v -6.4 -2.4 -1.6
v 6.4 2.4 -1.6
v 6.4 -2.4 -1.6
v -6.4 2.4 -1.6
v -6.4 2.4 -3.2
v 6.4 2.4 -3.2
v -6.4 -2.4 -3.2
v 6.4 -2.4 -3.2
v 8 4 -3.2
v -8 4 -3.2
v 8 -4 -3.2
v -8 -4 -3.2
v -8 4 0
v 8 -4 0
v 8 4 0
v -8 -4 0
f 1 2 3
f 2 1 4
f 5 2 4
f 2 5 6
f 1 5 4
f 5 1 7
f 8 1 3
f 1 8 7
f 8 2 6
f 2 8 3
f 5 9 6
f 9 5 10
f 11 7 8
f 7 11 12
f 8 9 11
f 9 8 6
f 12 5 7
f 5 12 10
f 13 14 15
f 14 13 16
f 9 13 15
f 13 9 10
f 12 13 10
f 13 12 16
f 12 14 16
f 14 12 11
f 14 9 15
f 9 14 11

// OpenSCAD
// file: ../p/box5.scad
use <../lib.scad>
function ldraw_lib__box5() = [
// 0 Box with 5 Faces and All Edges
// 0 Name: box5.dat
// 0 Author: James Jessiman
// 0 !LDRAW_ORG Primitive UPDATE 2012-01
// 0 !LICENSE Licensed under CC BY 4.0 : see CAreadme.txt
// 
// 0 BFC CERTIFY CCW
  [0,"BFC","CERTIFY"],
  [0,"BFC","CCW"],
// 
// 0 !HISTORY 2002-04-03 [sbliss] Modified for BFC compliance
// 0 !HISTORY 2002-04-25 [PTadmin] Official Update 2002-02
// 0 !HISTORY 2007-06-24 [PTadmin] Header formatted for Contributor Agreement
// 0 !HISTORY 2008-07-01 [PTadmin] Official Update 2008-01
// 0 !HISTORY 2012-02-16 [Philo] Changed to CCW
// 0 !HISTORY 2012-03-30 [PTadmin] Official Update 2012-01
// 
// 
// 2 24 1 1 1 -1 1 1
  [2,24,1,1,1,-1,1,1],
// 2 24 -1 1 1 -1 1 -1
  [2,24,-1,1,1,-1,1,-1],
// 2 24 -1 1 -1 1 1 -1
  [2,24,-1,1,-1,1,1,-1],
// 2 24 1 1 -1 1 1 1
  [2,24,1,1,-1,1,1,1],
// 2 24 1 0 1 -1 0 1
  [2,24,1,0,1,-1,0,1],
// 2 24 -1 0 1 -1 0 -1
  [2,24,-1,0,1,-1,0,-1],
// 2 24 -1 0 -1 1 0 -1
  [2,24,-1,0,-1,1,0,-1],
// 2 24 1 0 -1 1 0 1
  [2,24,1,0,-1,1,0,1],
// 2 24 1 0 1 1 1 1
  [2,24,1,0,1,1,1,1],
// 2 24 -1 0 1 -1 1 1
  [2,24,-1,0,1,-1,1,1],
// 2 24 1 0 -1 1 1 -1
  [2,24,1,0,-1,1,1,-1],
// 2 24 -1 0 -1 -1 1 -1
  [2,24,-1,0,-1,-1,1,-1],
// 4 16 -1 1 1 1 1 1 1 1 -1 -1 1 -1
  [4,16,-1,1,1,1,1,1,1,1,-1,-1,1,-1],
// 4 16 -1 1 1 -1 0 1 1 0 1 1 1 1
  [4,16,-1,1,1,-1,0,1,1,0,1,1,1,1],
// 4 16 -1 1 -1 -1 0 -1 -1 0 1 -1 1 1
  [4,16,-1,1,-1,-1,0,-1,-1,0,1,-1,1,1],
// 4 16 1 1 -1 1 0 -1 -1 0 -1 -1 1 -1
  [4,16,1,1,-1,1,0,-1,-1,0,-1,-1,1,-1],
// 4 16 1 1 1 1 0 1 1 0 -1 1 1 -1
  [4,16,1,1,1,1,0,1,1,0,-1,1,1,-1],
];
module ldraw_lib__box5(step=0, col=false, unit=2/5, alt=false, line=0.2, solid=!$preview)
    makepoly(ldraw_lib__box5(), step=step, col=col, unit=unit, alt=alt, line=line, solid=solid);
ldraw_lib__box5(line=0.2);
// main file
use <../lib.scad>
use <../p/box5.scad>
function ldraw_lib__3069a() = [
// 0 Tile  1 x  2 without Groove
// 0 Name: 3069a.dat
// 0 Author: James Jessiman
// 0 !LDRAW_ORG Part UPDATE 2025-09
// 0 !LICENSE Licensed under CC BY 4.0 : see CAreadme.txt
// 
// 0 BFC CERTIFY CCW
  [0,"BFC","CERTIFY"],
  [0,"BFC","CCW"],
// 
// 0 !HISTORY 2003-06-18 [Steffen] BFCed
// 0 !HISTORY 2003-08-01 [PTadmin] Official Update 2003-02
// 0 !HISTORY 2007-06-13 [PTadmin] Header formatted for Contributor Agreement
// 0 !HISTORY 2008-07-01 [PTadmin] Official Update 2008-01
// 0 !HISTORY 2025-09-27 [OrionP] Changed winding to CCW
// 0 !HISTORY 2025-09-29 [OrionP] Official Update 2025-09
// 
// 0 BFC INVERTNEXT
  [0,"BFC","INVERTNEXT"],
// 1 16 0 8 0 16 0 0 0 -4 0 0 0 6 box5.dat
  [1,16,0,8,0,16,0,0,0,-4,0,0,0,6, ldraw_lib__box5()],
// 4 16 20 8 10 16 8 6 -16 8 6 -20 8 10
  [4,16,20,8,10,16,8,6,-16,8,6,-20,8,10],
// 4 16 -20 8 -10 -16 8 -6 16 8 -6 20 8 -10
  [4,16,-20,8,-10,-16,8,-6,16,8,-6,20,8,-10],
// 4 16 20 8 -10 16 8 -6 16 8 6 20 8 10
  [4,16,20,8,-10,16,8,-6,16,8,6,20,8,10],
// 4 16 -20 8 10 -16 8 6 -16 8 -6 -20 8 -10
  [4,16,-20,8,10,-16,8,6,-16,8,-6,-20,8,-10],
// 1 16 0 8 0 20 0 0 0 -8 0 0 0 10 box5.dat
  [1,16,0,8,0,20,0,0,0,-8,0,0,0,10, ldraw_lib__box5()],
// 0
];
module ldraw_lib__3069a(step=0, col=false, unit=2/5, alt=false, line=0.2, solid=!$preview)
    makepoly(ldraw_lib__3069a(), step=step, col=col, unit=unit, alt=alt, line=line, solid=solid);
ldraw_lib__3069a(line=0.2);
